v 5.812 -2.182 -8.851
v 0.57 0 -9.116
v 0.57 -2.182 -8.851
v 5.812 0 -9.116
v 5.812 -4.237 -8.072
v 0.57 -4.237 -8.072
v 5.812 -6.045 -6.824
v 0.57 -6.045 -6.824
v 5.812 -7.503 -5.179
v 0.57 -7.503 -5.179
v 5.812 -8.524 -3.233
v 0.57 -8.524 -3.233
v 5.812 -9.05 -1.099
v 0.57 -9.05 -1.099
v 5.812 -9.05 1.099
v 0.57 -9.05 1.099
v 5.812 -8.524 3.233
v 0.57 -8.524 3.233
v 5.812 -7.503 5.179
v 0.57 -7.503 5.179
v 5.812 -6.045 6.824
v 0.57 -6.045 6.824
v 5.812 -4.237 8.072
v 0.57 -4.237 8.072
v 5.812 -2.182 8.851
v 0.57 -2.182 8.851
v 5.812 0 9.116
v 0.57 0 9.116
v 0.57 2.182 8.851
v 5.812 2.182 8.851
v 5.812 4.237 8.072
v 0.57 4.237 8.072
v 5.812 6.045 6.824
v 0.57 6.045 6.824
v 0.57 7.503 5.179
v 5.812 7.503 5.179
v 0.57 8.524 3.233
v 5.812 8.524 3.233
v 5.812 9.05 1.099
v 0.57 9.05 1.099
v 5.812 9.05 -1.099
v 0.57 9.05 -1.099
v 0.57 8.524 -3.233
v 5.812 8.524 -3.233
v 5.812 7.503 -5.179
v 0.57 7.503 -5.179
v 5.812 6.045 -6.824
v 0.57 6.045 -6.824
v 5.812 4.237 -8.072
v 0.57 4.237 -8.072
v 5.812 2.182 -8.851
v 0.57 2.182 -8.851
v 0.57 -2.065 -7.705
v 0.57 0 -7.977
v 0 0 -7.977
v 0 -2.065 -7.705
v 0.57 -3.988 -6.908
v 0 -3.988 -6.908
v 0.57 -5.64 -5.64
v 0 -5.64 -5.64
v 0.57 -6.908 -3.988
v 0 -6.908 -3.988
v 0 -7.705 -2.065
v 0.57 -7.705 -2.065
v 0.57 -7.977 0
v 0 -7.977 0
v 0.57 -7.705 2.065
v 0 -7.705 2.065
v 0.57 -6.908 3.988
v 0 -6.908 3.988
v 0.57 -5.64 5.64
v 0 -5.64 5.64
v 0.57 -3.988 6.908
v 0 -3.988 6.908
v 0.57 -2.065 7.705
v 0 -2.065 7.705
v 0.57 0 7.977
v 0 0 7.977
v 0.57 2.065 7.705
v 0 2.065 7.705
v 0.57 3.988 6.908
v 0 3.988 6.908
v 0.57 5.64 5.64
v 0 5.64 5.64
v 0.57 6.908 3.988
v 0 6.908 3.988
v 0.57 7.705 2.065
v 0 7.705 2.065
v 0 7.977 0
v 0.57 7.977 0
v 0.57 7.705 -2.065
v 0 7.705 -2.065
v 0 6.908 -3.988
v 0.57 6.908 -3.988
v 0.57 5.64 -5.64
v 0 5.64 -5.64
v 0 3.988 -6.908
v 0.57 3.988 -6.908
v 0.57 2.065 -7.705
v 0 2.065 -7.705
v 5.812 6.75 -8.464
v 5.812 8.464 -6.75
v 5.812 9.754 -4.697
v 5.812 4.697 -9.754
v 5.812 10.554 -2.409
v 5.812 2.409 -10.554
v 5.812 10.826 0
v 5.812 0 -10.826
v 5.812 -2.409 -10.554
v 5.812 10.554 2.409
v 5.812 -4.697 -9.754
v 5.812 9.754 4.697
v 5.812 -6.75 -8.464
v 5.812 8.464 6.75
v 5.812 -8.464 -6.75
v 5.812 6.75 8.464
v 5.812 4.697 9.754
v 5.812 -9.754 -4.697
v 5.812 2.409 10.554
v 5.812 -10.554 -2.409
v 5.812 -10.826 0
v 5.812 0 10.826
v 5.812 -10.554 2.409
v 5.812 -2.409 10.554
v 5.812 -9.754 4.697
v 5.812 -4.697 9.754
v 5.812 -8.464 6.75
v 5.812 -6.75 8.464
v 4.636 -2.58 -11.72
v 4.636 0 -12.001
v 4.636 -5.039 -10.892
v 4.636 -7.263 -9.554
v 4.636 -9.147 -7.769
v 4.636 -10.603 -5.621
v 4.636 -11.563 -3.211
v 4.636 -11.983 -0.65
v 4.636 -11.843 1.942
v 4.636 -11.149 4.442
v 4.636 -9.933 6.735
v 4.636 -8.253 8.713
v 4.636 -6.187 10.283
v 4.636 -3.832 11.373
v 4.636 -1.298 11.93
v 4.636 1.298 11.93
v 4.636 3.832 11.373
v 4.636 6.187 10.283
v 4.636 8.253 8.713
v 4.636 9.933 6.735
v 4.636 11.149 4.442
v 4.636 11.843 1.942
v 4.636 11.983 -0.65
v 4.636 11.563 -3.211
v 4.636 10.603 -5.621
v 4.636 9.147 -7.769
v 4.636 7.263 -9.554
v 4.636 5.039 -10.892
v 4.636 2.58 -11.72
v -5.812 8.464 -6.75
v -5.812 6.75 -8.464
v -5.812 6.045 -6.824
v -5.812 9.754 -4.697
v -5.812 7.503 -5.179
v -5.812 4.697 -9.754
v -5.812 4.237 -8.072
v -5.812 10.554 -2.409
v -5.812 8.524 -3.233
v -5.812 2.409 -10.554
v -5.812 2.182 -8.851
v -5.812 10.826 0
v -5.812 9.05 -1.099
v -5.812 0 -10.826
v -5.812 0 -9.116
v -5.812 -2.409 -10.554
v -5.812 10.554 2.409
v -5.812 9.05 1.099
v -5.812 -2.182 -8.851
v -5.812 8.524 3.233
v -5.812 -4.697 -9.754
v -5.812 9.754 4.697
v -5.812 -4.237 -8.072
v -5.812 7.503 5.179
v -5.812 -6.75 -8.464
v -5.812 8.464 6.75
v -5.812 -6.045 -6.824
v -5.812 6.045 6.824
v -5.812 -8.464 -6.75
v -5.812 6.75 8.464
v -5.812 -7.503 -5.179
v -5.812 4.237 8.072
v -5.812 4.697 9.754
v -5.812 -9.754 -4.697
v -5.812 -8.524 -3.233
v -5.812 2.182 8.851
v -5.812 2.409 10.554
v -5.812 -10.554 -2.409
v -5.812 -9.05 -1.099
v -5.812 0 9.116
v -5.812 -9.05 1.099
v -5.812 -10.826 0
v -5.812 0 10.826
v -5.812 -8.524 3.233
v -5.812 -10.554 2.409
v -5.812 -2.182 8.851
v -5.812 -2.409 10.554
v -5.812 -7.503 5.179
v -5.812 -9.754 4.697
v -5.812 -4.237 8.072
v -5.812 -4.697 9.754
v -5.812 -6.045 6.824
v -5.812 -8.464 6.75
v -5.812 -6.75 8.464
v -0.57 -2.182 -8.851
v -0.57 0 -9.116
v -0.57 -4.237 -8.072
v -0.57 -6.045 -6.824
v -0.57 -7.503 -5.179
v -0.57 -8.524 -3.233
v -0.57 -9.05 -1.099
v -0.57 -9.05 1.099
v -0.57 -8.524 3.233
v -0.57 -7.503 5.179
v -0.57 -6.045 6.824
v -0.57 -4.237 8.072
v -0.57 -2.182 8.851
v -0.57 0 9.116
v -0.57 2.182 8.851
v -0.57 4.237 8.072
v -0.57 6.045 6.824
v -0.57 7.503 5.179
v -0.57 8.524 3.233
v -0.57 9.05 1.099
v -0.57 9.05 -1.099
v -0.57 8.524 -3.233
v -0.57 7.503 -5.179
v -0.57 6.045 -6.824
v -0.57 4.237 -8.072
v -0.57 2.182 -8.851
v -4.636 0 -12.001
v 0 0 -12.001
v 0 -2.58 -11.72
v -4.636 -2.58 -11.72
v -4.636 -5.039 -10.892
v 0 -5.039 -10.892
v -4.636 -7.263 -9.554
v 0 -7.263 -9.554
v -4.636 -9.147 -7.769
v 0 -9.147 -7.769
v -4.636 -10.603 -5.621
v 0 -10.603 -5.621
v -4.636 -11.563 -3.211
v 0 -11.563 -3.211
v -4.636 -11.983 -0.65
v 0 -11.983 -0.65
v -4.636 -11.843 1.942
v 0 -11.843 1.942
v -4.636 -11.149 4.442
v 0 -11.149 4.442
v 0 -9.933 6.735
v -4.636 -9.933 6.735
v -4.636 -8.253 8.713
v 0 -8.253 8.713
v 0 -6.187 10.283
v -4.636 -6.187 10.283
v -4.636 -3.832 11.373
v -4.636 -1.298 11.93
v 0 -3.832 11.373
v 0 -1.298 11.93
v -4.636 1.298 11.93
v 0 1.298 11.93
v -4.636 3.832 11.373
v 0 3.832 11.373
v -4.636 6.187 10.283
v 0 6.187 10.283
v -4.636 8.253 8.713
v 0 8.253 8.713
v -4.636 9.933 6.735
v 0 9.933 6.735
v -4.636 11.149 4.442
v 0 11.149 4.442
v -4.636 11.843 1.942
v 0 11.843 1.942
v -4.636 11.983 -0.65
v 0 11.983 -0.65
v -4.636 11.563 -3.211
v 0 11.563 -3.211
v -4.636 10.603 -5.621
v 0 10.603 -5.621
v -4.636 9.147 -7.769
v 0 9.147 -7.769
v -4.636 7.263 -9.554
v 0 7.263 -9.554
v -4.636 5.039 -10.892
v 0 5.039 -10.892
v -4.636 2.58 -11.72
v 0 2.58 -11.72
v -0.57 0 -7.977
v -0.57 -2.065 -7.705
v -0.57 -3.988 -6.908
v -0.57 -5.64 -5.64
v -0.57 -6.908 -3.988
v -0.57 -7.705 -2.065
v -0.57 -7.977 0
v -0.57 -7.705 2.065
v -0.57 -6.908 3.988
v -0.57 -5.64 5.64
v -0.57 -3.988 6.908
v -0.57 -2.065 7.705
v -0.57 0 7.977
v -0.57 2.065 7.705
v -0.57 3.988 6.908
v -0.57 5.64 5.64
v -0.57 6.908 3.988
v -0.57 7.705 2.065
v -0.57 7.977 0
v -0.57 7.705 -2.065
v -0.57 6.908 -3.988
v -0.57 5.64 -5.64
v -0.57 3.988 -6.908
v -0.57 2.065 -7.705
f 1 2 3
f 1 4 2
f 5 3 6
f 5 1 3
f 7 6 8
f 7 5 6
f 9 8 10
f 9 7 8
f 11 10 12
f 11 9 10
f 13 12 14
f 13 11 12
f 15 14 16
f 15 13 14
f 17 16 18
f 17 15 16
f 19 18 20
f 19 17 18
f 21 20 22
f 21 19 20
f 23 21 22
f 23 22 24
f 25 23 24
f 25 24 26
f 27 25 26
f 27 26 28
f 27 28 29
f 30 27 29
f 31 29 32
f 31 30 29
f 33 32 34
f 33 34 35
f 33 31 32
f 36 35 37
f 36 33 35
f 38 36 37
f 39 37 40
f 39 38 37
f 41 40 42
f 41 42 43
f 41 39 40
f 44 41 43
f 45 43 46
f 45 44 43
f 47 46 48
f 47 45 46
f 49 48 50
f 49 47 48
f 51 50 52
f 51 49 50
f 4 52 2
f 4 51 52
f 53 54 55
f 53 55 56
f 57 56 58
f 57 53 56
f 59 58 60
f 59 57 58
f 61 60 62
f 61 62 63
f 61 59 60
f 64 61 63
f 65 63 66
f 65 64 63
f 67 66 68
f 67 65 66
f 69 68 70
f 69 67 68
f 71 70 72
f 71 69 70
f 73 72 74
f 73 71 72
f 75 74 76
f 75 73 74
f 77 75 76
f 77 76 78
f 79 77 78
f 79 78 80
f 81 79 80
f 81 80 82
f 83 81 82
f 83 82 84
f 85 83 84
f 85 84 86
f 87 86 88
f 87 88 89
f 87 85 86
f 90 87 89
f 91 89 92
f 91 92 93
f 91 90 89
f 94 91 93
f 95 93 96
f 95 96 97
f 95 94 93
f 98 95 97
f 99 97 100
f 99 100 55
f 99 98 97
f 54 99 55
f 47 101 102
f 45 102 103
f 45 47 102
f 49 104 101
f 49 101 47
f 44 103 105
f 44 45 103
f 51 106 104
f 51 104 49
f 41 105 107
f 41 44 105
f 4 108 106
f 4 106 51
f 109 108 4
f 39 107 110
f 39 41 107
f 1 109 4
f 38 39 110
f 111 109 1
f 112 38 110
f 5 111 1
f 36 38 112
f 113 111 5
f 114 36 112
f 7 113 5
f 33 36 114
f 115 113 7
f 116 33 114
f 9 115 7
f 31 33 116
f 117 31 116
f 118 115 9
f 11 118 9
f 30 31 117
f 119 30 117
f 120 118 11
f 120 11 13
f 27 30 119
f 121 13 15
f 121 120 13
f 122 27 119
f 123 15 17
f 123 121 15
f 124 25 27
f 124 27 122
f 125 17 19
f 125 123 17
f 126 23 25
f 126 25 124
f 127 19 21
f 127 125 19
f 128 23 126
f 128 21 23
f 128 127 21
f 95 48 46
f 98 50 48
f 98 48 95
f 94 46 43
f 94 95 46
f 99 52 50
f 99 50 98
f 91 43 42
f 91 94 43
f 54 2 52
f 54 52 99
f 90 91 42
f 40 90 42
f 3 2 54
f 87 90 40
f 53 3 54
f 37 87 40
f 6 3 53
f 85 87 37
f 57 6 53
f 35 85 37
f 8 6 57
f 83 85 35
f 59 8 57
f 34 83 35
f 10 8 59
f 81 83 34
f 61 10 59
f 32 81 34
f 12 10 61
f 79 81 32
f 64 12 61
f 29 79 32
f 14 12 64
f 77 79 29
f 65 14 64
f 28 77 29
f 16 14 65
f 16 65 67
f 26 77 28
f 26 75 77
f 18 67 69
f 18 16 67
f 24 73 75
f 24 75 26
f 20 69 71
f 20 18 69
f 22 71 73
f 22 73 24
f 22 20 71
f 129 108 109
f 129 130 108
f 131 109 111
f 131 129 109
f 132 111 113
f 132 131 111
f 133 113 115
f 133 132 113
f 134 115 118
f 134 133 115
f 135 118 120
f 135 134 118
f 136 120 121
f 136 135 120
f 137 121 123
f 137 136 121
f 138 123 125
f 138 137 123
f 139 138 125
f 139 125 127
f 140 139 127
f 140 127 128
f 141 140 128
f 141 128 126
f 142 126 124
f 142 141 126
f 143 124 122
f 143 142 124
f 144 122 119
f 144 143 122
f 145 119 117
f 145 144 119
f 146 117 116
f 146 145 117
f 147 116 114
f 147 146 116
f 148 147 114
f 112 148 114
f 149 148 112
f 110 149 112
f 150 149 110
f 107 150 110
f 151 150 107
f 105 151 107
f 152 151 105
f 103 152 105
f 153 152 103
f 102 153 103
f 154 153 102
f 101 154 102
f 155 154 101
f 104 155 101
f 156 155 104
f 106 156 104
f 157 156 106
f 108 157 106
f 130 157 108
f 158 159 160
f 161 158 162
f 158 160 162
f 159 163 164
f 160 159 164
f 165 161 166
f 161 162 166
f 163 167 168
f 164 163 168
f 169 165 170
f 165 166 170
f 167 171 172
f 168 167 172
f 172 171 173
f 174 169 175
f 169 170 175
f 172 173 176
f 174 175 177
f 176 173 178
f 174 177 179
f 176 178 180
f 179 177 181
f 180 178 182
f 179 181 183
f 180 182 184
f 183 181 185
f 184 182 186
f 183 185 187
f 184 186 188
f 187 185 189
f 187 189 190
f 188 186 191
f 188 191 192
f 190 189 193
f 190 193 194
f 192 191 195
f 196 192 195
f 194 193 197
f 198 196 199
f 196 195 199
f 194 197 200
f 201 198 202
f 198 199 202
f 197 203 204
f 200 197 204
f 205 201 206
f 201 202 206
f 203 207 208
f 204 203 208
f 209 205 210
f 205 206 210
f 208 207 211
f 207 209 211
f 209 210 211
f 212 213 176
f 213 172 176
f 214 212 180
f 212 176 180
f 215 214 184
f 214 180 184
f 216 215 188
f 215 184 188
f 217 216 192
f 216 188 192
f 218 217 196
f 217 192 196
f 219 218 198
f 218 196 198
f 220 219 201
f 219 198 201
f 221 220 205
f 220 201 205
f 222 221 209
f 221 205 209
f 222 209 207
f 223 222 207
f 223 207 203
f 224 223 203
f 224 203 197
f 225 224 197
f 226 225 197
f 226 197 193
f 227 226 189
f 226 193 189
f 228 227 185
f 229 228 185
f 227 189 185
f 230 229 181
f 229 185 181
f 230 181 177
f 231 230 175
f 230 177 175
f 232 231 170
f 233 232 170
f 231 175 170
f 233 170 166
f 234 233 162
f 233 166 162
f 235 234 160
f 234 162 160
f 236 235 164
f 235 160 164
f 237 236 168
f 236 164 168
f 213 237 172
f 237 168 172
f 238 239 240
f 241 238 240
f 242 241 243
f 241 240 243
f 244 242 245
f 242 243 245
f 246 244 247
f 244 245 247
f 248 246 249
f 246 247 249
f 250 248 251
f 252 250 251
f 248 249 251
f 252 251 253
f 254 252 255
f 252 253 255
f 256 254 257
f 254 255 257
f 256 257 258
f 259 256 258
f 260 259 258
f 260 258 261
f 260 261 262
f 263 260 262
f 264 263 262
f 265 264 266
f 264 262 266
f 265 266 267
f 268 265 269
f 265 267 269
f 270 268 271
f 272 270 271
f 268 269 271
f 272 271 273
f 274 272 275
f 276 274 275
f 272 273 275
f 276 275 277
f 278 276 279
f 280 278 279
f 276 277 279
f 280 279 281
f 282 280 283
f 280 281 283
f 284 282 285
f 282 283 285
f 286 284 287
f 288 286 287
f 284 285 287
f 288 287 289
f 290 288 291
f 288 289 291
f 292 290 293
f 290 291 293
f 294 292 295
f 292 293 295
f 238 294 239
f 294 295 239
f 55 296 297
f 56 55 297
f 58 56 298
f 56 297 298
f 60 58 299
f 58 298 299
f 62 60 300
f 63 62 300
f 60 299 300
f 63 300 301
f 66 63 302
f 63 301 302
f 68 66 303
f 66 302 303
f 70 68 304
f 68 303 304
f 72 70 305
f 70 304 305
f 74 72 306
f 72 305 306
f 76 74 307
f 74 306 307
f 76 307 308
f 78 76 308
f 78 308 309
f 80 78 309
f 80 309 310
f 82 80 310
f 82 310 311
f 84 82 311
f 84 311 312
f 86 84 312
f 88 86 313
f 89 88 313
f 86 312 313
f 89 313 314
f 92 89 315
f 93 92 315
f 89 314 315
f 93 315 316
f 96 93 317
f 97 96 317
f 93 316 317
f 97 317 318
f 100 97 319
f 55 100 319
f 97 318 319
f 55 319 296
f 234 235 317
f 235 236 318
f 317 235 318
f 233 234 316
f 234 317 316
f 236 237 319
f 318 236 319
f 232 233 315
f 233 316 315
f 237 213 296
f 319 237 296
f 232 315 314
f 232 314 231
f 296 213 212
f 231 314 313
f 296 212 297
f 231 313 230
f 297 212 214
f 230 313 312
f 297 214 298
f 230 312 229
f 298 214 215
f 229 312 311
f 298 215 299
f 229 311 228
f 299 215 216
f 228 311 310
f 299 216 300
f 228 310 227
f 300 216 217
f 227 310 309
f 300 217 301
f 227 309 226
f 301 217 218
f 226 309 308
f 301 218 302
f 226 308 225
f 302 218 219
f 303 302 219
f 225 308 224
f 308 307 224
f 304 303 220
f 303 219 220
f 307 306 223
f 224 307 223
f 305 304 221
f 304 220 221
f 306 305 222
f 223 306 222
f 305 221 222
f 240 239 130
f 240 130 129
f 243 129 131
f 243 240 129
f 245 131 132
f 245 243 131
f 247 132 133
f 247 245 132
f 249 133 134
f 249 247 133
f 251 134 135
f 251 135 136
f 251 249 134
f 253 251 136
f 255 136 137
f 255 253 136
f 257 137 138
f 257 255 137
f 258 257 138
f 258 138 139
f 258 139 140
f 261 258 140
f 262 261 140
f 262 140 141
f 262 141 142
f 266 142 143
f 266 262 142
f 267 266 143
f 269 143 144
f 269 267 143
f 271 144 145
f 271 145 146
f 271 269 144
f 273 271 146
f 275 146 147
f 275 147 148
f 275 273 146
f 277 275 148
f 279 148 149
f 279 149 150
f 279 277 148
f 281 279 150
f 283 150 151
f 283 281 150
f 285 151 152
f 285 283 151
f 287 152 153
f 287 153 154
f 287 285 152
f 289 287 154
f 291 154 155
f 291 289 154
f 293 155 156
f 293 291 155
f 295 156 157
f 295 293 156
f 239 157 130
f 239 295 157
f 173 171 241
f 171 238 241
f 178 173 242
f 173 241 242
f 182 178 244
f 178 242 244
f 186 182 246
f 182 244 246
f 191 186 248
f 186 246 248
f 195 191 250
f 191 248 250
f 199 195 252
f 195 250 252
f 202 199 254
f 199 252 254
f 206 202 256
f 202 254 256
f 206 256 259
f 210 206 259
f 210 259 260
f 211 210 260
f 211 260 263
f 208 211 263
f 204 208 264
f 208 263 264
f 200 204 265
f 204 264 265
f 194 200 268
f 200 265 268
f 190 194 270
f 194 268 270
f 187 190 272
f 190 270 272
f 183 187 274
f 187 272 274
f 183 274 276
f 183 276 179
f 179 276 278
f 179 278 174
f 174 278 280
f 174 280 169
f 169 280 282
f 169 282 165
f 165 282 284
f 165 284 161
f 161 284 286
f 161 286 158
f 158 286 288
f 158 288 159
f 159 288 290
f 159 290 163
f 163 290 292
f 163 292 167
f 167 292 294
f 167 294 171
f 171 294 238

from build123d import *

# Parameters (mm, degrees)
SCALE1_SCALE = 1.142857143
SCALE2_SCALE = 0.997091816


with BuildPart() as part:
    # Sketch1 → Revolve1 (revolve)
    with BuildSketch(Plane.XY, mode=Mode.PRIVATE) as revolve1_sk:
        Polygon((0, 7), (-0.5, 7), (-0.5, 8), (-5.1, 8), (-5.1, 9.5), (-4.068629558, 10.531370442), (0, 10.531370442), align=None)
    revolve1 = revolve(revolve1_sk.sketch.rotate(Axis((0, 0, 0), (-1, 0, 0)), 90), axis=Axis((0, 0, 0), (-1, 0, 0)))

    # Mirror1: Revolve1 across plane
    add(revolve1.mirror(Plane(origin=(0, 10.531370442, 0), x_dir=(0, 0, 1), z_dir=(1, 0, 0))))


with BuildPart() as part_1:
    # Scale1: scaled about (0, 0, 0)
    add(part.part.scale(SCALE1_SCALE))


with BuildPart() as part_2:
    # Scale2: scaled about (0, 0, 0)
    add(part_1.part.scale(SCALE2_SCALE))


solid = part_2.part
